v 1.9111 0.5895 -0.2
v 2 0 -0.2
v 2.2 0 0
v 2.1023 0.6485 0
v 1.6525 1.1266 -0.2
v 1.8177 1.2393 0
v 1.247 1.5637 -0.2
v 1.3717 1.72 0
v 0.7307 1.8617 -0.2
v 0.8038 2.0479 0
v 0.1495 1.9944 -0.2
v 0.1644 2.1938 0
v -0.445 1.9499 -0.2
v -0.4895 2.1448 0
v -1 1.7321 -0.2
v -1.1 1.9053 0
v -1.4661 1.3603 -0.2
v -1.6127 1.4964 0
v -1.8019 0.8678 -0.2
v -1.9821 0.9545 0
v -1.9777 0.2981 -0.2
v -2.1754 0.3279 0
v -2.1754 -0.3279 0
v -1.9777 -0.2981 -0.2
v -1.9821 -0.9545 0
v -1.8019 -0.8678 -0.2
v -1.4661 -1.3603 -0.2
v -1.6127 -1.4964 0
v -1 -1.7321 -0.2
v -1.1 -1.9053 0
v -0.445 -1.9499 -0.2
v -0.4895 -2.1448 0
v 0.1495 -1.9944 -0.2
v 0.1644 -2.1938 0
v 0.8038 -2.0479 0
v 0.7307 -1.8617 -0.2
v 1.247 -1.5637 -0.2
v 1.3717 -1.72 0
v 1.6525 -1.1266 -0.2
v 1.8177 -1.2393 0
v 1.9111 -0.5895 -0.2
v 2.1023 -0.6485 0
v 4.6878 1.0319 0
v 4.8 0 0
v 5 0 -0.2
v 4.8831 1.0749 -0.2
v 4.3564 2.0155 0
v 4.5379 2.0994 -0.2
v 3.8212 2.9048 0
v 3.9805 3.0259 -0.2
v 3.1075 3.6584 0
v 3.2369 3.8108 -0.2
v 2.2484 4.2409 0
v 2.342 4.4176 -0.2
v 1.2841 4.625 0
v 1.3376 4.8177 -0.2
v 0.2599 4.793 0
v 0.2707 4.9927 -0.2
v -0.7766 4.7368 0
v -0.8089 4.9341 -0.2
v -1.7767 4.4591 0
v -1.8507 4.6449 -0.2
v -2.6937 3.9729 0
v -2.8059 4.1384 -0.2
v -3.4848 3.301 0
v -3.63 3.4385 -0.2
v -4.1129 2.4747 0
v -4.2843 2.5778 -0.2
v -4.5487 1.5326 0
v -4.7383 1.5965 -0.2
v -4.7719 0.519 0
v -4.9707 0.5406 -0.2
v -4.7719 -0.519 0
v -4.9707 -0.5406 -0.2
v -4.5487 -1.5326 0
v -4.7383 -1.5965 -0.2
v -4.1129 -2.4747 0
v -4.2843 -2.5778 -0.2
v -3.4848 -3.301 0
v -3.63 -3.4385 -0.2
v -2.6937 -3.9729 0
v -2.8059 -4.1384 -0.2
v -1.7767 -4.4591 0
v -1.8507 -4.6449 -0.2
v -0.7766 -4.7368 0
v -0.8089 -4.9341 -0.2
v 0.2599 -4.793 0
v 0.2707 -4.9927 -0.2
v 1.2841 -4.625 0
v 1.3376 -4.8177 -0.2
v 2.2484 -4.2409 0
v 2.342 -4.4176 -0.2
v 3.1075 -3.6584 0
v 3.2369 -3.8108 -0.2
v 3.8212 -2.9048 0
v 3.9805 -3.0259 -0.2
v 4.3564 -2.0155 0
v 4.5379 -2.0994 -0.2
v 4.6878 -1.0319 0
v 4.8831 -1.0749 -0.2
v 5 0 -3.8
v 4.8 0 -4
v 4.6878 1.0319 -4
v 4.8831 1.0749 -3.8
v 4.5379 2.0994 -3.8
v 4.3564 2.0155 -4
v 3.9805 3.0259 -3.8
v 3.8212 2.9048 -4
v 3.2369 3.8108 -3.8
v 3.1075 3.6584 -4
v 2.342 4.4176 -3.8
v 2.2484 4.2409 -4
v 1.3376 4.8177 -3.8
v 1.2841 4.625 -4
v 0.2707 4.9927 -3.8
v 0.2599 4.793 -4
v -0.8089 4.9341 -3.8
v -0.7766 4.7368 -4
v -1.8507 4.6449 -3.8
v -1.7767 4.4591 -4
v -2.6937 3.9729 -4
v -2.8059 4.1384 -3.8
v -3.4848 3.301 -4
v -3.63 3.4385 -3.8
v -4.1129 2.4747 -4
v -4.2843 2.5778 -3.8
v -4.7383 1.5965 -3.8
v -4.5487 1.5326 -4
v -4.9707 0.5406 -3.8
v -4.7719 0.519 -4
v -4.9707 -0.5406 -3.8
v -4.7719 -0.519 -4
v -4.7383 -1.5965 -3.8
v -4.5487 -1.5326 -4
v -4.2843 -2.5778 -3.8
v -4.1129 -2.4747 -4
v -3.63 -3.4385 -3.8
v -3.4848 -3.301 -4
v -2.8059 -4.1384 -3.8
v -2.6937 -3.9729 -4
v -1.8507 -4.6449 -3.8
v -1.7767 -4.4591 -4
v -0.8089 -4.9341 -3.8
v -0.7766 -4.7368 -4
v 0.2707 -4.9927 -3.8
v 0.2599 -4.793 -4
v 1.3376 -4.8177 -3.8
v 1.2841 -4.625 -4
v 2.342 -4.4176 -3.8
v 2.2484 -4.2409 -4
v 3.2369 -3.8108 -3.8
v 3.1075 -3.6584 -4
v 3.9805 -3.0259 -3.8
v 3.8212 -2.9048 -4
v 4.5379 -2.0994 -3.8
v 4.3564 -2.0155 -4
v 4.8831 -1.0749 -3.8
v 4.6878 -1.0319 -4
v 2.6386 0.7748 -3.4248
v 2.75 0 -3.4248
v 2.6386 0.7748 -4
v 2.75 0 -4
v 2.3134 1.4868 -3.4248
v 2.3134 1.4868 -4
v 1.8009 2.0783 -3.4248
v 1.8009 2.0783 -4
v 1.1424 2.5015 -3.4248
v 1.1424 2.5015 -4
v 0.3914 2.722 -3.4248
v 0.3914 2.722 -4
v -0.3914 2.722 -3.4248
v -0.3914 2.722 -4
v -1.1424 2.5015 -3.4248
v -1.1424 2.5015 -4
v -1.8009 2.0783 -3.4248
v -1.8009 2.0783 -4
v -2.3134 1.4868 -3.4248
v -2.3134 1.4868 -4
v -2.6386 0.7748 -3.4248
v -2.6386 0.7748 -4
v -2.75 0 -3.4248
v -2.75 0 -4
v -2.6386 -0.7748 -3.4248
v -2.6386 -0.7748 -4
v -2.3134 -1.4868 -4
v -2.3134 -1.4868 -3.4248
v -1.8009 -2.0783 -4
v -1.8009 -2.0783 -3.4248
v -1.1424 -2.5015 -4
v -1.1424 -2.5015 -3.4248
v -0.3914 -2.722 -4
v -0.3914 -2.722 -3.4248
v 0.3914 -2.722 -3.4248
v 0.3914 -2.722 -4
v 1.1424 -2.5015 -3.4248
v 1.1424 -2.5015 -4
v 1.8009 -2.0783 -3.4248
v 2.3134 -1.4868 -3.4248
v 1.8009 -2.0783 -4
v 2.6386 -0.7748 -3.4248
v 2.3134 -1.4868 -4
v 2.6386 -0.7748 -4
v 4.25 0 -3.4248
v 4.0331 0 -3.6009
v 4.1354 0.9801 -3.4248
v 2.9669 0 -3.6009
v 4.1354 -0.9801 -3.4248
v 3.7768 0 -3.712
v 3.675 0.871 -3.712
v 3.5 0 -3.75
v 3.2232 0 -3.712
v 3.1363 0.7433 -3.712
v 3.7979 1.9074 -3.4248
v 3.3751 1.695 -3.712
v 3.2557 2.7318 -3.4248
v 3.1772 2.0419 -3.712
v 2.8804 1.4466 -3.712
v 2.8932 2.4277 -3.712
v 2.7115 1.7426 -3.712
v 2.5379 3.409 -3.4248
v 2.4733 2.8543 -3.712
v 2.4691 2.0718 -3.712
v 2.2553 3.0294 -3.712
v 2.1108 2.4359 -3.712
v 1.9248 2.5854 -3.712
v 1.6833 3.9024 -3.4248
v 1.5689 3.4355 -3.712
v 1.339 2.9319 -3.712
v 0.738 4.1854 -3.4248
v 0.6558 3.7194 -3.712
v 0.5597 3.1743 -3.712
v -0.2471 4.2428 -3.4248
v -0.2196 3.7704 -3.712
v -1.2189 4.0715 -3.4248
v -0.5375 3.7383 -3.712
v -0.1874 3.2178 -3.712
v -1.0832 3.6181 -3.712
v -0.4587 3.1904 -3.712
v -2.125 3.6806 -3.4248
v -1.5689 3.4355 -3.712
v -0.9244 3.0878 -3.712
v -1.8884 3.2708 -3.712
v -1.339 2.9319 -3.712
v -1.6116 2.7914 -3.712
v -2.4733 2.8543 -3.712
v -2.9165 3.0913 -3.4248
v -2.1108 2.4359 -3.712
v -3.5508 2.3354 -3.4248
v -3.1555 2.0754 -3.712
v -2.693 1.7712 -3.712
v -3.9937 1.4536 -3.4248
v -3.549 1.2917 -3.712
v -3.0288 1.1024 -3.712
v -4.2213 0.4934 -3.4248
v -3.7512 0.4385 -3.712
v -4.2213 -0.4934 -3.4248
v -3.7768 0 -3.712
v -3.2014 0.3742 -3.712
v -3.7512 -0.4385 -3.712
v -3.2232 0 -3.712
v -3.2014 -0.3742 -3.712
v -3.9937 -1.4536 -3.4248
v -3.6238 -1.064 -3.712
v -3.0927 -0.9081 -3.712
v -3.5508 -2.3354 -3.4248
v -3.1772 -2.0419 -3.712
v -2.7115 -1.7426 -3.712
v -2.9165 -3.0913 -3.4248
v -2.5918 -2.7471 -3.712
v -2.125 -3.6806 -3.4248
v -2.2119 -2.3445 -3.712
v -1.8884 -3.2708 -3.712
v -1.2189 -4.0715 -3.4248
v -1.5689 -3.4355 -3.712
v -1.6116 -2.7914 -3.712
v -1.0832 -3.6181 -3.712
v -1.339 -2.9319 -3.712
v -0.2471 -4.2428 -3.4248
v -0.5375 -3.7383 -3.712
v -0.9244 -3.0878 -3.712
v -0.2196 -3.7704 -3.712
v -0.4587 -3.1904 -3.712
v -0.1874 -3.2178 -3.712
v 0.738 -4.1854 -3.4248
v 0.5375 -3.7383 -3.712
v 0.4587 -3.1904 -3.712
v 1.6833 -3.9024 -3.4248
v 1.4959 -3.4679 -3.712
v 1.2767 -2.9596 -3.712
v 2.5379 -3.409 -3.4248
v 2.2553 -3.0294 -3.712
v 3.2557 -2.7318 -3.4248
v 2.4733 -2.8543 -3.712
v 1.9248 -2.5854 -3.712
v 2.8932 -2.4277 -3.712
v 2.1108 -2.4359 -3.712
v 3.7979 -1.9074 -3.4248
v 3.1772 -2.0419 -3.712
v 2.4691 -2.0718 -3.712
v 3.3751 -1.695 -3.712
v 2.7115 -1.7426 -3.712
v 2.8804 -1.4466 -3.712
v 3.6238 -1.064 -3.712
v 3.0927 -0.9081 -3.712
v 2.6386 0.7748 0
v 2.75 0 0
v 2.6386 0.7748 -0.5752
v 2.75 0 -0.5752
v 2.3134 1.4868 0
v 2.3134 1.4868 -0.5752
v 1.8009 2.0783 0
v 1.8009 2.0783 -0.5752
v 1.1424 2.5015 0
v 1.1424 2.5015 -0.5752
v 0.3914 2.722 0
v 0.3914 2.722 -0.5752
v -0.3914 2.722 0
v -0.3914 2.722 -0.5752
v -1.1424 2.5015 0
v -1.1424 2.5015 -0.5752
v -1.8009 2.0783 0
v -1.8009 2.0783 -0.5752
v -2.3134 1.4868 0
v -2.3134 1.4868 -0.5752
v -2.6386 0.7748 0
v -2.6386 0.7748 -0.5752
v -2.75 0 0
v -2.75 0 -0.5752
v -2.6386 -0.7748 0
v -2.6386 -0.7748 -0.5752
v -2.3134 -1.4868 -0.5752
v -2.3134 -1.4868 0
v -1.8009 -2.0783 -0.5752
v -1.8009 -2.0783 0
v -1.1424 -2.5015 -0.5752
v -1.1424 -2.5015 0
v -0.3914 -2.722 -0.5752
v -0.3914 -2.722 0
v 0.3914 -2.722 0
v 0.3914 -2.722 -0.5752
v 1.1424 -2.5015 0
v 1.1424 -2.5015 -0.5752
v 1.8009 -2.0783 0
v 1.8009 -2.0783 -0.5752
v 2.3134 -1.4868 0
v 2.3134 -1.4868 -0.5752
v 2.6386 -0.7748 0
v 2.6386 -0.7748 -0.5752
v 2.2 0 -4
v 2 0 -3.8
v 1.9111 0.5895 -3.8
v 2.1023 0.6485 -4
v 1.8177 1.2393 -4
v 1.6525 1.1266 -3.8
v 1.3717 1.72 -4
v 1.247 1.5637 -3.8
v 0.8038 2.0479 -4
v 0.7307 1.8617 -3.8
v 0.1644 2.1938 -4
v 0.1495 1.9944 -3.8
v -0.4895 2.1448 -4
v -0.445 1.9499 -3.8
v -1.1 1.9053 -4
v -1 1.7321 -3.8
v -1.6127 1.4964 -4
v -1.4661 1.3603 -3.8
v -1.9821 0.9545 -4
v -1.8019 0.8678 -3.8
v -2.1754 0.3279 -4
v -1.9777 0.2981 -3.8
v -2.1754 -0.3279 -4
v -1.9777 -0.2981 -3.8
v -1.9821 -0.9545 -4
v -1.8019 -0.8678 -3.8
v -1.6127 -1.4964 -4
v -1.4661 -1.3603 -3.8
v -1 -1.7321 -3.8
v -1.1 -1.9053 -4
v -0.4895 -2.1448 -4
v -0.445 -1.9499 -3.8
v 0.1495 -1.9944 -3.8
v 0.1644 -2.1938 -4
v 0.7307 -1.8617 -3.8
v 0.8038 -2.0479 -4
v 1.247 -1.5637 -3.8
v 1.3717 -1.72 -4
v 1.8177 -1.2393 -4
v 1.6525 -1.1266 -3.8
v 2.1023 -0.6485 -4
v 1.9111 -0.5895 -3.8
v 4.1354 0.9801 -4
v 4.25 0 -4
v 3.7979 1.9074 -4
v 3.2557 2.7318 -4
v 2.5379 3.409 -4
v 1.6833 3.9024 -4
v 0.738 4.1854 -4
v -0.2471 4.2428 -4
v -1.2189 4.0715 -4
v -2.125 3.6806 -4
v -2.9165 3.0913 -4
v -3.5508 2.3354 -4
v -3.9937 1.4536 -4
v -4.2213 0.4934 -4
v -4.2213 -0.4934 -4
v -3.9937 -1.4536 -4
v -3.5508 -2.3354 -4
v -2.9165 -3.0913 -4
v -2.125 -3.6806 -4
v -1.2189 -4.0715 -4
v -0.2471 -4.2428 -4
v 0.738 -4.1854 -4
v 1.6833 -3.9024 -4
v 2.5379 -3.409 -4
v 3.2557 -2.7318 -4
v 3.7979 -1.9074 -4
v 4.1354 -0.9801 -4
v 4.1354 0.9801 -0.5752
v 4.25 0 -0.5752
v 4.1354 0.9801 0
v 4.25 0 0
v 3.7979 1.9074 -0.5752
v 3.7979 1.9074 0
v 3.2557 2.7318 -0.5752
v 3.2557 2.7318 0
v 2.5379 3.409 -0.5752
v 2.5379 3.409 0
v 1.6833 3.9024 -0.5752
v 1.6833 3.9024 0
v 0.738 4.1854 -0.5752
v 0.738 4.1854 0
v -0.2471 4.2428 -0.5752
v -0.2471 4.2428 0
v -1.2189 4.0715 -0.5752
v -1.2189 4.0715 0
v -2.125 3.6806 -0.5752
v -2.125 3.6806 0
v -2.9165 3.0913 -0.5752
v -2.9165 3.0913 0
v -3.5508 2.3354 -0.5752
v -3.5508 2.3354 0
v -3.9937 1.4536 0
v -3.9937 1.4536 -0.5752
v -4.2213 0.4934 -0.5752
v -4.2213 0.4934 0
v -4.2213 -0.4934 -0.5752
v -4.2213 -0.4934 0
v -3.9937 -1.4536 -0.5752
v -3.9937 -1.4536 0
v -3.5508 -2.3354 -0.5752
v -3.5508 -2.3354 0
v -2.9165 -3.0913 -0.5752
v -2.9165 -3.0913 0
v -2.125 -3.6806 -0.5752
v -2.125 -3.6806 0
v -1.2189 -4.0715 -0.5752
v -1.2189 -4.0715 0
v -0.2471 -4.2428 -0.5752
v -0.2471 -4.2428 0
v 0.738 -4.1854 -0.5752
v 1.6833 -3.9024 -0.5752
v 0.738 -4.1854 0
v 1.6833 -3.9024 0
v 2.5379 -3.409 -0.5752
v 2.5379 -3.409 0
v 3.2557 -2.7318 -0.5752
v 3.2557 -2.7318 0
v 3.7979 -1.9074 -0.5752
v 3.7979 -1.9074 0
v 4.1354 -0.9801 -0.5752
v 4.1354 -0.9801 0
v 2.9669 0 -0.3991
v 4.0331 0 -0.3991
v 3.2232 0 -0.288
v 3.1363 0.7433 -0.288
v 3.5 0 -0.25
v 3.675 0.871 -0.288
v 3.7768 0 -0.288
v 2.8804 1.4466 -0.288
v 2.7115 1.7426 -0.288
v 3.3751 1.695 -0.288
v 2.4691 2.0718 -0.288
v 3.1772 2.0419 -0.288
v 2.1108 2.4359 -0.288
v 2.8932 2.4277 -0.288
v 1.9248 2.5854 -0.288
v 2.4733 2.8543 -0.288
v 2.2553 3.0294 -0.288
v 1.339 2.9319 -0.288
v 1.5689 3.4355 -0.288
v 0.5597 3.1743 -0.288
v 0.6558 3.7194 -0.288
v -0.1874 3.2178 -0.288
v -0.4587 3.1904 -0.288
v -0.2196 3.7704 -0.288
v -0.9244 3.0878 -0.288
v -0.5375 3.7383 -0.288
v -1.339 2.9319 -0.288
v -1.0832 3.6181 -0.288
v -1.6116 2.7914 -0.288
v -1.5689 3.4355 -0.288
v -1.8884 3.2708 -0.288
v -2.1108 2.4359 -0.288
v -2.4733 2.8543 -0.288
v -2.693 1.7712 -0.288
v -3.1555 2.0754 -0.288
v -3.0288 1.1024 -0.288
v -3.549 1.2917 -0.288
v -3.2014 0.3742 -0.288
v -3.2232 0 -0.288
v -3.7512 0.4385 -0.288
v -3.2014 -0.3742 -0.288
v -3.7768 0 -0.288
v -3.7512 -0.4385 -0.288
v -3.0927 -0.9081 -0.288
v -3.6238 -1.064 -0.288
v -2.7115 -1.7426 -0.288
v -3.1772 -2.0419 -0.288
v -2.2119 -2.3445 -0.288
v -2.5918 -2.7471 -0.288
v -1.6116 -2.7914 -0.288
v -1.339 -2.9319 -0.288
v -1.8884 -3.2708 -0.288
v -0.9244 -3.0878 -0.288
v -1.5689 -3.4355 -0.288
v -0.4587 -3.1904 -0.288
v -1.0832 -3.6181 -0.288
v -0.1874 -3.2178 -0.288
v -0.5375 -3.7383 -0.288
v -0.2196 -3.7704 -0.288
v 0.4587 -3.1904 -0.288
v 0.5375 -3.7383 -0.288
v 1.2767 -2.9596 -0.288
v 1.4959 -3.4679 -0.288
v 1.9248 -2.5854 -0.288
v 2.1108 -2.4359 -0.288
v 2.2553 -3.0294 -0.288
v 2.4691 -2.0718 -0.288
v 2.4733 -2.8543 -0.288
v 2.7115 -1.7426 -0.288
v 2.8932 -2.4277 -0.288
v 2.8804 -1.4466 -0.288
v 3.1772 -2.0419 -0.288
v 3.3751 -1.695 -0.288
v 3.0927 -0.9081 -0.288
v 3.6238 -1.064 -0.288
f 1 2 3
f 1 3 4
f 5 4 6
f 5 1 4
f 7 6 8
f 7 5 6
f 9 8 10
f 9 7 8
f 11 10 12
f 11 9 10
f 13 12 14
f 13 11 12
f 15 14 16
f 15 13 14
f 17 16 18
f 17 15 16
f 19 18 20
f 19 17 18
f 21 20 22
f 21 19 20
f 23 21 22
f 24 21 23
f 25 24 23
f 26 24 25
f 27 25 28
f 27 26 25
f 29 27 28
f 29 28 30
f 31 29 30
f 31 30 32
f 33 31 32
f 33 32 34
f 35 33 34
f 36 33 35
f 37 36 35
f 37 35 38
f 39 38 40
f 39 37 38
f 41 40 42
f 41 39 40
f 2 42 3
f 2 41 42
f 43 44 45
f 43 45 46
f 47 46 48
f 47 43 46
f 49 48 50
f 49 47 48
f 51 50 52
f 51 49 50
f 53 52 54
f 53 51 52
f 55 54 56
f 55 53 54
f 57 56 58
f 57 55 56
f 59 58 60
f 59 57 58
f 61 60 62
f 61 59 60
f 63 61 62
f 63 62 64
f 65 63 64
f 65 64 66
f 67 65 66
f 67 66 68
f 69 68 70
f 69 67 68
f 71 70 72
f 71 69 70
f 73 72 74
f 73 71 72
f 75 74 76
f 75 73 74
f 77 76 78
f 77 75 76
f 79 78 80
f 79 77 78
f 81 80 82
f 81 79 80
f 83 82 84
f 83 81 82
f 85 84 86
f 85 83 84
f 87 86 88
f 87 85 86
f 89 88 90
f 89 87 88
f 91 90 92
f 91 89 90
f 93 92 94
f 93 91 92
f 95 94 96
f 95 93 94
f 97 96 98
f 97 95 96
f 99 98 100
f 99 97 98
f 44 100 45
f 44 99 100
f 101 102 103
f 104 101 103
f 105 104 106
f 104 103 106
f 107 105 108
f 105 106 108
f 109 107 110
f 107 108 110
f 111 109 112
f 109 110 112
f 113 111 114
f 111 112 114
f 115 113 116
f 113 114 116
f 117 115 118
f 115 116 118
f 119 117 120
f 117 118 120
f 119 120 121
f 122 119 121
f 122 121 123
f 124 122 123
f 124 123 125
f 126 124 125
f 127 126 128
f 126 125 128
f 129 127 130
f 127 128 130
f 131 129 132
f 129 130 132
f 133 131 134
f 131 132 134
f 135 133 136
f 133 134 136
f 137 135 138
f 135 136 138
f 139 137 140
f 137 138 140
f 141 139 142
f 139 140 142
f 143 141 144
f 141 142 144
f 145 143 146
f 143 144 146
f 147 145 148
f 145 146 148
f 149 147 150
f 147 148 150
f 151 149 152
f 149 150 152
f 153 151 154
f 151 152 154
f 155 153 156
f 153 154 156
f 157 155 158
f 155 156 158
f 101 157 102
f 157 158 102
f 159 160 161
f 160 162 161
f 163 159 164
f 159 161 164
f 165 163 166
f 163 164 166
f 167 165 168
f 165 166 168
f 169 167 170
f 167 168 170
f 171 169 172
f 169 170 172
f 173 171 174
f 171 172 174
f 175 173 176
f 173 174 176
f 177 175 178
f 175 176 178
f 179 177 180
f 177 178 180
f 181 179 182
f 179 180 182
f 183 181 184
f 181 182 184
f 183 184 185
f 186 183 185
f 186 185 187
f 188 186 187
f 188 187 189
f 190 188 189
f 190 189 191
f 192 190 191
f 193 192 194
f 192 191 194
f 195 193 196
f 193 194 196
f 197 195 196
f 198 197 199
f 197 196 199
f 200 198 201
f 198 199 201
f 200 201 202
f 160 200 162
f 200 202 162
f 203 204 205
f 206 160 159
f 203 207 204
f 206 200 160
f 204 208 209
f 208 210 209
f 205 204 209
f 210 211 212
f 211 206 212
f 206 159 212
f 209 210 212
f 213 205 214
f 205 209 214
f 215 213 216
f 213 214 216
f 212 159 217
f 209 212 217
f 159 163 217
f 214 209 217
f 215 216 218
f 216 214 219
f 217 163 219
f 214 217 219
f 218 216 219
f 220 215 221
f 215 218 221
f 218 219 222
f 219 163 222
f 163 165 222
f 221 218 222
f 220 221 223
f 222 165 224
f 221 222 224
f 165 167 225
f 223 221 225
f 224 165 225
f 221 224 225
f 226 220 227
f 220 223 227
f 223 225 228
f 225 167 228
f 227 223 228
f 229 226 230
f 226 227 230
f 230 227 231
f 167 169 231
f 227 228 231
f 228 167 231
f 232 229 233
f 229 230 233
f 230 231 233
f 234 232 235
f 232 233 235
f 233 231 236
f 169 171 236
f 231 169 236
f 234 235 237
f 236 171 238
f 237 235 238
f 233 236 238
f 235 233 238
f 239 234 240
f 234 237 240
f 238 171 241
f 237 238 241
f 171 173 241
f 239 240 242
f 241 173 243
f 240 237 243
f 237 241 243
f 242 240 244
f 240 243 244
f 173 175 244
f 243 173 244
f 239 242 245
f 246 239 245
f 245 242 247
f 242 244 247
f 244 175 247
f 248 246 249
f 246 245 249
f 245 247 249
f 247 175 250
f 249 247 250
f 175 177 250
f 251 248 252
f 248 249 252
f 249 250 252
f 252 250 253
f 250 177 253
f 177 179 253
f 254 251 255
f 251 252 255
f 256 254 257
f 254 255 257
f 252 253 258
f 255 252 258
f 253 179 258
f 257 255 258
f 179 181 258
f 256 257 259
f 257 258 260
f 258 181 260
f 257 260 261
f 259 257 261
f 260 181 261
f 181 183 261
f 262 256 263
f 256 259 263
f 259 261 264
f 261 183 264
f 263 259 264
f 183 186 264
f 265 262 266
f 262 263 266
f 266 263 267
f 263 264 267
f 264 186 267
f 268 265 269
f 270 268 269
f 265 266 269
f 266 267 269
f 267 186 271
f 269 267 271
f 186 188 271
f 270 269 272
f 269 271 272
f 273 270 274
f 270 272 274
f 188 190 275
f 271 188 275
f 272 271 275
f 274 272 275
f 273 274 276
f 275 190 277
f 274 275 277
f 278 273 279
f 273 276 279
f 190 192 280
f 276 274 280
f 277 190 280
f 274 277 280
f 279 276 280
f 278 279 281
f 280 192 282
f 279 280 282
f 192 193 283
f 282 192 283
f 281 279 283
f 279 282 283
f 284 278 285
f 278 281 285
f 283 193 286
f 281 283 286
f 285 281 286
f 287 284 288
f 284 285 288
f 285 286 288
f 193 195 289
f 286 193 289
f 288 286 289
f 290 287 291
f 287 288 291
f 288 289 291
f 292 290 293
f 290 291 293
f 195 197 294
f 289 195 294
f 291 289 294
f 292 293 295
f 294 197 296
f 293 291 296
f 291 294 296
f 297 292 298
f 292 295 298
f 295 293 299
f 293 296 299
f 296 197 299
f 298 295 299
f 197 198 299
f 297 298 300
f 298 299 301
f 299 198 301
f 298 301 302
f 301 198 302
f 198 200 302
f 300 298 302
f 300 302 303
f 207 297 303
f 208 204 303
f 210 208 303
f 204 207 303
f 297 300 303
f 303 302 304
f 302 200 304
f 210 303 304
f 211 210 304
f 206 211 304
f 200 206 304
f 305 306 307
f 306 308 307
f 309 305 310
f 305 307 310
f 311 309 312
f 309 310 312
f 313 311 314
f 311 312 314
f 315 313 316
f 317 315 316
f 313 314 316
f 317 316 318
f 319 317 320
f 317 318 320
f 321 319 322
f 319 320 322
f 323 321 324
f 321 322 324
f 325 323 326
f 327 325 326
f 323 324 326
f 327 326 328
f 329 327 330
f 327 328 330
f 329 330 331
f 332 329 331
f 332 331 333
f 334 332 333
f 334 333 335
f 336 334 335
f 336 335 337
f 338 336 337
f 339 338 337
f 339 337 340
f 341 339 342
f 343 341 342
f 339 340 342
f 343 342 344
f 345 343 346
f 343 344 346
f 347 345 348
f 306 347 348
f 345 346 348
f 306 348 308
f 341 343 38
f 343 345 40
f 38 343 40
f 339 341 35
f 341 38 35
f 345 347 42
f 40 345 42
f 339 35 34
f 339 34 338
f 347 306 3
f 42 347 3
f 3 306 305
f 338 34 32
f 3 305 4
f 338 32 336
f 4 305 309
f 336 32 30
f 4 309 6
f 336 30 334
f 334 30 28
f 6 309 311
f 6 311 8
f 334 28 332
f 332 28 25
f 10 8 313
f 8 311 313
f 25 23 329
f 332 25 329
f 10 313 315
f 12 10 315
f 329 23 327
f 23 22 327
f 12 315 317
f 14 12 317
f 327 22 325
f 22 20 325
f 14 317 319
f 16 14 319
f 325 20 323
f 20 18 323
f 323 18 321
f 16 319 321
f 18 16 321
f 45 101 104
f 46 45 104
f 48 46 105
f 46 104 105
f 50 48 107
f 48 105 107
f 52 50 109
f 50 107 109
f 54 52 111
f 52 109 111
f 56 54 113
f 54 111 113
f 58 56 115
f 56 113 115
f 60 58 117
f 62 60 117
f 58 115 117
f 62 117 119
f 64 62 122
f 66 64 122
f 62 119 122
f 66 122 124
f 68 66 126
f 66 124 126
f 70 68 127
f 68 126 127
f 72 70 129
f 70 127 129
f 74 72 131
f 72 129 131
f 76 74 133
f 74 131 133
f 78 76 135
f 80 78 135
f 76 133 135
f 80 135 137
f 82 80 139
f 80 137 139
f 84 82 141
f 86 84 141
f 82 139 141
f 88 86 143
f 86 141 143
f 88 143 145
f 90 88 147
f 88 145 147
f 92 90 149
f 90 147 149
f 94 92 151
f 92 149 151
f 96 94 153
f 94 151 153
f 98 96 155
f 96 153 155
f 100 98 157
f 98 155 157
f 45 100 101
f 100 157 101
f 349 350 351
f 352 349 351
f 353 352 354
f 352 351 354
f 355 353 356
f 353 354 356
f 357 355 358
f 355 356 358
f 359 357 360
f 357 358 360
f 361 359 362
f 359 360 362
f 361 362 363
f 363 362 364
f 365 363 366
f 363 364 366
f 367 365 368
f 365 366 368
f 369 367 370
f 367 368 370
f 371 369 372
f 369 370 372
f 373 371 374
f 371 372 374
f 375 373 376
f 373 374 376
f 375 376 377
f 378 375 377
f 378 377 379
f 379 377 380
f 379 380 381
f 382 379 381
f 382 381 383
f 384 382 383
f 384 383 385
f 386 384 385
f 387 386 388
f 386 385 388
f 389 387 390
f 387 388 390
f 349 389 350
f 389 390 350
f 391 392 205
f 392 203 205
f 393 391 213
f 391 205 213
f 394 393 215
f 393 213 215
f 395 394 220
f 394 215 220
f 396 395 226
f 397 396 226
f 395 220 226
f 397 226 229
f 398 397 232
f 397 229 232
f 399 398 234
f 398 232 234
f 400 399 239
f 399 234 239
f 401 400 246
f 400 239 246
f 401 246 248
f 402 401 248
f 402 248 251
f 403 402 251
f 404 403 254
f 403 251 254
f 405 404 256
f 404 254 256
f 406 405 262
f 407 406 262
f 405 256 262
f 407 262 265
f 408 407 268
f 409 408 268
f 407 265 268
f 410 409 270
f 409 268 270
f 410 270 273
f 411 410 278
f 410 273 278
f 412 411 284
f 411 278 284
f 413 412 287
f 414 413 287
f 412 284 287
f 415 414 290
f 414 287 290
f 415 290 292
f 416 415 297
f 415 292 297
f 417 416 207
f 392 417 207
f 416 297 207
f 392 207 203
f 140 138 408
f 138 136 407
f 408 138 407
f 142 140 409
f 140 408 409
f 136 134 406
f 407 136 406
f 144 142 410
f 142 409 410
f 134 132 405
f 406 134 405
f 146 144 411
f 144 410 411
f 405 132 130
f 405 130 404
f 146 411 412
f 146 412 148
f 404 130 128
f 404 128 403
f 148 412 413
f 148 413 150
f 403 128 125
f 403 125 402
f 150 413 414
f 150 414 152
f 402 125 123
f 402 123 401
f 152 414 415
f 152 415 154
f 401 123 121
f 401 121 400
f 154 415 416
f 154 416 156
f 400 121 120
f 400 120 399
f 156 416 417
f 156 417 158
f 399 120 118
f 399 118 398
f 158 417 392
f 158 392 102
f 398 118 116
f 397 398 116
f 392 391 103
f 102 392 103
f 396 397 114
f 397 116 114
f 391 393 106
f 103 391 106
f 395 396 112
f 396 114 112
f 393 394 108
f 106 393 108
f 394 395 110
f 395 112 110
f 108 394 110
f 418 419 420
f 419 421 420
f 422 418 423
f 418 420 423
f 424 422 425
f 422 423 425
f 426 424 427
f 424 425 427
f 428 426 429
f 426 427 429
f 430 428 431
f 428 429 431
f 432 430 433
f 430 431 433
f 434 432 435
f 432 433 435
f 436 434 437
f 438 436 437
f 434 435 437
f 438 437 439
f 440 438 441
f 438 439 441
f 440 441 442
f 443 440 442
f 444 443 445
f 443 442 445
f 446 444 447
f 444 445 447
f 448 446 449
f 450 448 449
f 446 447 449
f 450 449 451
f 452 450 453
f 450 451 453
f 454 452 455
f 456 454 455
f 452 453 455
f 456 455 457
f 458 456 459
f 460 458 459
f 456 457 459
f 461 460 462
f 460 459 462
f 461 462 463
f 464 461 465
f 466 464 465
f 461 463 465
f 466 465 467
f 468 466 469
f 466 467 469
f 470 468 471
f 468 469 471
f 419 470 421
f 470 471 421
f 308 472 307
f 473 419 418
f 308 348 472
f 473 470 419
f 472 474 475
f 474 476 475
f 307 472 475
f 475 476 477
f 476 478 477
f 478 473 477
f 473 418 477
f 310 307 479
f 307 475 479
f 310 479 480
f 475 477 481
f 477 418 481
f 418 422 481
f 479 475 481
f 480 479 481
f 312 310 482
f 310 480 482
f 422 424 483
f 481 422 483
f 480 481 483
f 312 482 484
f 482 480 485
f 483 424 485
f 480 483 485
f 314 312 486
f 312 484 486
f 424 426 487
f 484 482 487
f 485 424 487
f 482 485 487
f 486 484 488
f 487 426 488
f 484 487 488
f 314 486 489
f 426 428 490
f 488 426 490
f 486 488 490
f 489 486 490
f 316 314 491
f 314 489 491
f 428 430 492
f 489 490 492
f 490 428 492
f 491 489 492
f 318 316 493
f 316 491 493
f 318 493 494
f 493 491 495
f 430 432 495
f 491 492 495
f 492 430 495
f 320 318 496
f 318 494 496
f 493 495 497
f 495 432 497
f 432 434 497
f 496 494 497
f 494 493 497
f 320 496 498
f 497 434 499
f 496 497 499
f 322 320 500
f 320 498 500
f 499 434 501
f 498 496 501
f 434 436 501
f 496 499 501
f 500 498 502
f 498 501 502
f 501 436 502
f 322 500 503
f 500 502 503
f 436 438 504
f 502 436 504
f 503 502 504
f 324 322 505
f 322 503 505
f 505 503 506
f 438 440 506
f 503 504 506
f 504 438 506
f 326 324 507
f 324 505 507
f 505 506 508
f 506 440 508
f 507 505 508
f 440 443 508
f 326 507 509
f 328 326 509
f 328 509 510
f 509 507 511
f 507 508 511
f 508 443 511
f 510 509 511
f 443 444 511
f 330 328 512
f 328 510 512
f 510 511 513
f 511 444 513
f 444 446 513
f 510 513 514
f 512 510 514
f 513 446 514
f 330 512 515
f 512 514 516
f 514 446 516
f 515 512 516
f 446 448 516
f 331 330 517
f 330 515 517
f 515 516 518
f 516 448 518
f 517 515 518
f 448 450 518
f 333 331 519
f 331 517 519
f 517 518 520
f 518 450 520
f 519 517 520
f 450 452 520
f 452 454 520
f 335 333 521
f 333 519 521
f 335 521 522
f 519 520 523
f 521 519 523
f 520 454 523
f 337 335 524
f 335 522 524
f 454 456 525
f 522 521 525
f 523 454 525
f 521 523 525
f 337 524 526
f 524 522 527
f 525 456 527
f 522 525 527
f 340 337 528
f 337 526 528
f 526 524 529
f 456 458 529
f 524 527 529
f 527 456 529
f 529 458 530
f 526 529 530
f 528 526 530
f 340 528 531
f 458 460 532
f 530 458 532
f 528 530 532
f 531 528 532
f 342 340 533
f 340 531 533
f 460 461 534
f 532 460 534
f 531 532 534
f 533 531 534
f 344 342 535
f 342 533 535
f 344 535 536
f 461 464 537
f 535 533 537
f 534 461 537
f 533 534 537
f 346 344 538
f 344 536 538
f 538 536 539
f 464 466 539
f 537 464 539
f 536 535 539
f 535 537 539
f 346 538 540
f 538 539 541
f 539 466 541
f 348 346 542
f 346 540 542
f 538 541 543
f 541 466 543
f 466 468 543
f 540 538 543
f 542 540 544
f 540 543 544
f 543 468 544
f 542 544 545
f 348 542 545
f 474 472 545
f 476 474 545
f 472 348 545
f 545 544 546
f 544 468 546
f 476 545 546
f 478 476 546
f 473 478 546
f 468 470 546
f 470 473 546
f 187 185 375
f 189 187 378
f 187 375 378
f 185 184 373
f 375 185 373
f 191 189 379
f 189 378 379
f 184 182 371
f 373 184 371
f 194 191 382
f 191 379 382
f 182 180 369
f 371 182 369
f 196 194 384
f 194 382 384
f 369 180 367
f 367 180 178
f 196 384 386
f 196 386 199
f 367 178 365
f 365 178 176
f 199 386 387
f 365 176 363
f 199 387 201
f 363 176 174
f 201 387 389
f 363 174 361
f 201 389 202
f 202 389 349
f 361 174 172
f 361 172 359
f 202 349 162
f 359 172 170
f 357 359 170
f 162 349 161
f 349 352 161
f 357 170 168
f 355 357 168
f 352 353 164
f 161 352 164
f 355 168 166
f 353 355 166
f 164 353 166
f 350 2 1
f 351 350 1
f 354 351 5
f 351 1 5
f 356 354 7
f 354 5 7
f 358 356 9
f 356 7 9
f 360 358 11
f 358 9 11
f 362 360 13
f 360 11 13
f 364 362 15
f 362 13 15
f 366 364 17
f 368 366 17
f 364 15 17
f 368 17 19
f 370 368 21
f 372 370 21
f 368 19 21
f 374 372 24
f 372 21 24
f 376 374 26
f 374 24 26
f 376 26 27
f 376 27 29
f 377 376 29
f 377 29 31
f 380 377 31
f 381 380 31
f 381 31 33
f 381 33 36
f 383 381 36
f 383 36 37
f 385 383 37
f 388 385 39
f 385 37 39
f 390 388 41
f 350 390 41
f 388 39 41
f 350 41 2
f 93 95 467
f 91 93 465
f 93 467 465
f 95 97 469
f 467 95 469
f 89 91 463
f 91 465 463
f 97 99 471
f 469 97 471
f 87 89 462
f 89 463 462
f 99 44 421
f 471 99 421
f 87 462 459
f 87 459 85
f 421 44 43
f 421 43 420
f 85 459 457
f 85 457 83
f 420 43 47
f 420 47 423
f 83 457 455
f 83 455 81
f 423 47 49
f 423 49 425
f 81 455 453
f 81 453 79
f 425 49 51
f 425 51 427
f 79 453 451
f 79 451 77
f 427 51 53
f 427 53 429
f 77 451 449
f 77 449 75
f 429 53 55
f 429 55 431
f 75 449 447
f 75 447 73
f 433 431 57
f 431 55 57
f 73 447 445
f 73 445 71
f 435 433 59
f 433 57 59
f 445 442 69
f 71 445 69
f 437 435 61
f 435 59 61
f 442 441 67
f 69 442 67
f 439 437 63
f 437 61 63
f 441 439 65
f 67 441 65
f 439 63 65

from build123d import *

# Parameters (mm, degrees)
CHAMFER1_SIZE = 0.2
CHAMFER2_SIZE = 0.2
CHAMFER3_SIZE = 0.2
CHAMFER4_SIZE = 0.2


with BuildPart() as part:
    # Sketch1 → Revolve1 (revolve)
    with BuildSketch(Plane(origin=(0, 0, 0), x_dir=(1, 0, 0), z_dir=(0, 1, 0))):
        with BuildLine():
            Line((2.75, 3.424799903), (2.75, 4))
            Line((2.75, 4), (2, 4))
            Line((2, 4), (2, 0))
            Line((2, 0), (2.75, 0))
            Line((2.75, 0), (2.75, 0.575200097))
            ThreePointArc((2.75, 0.575200097), (3.5, 0.25), (4.25, 0.575200097))
            Line((4.25, 0.575200097), (4.25, 0))
            Line((4.25, 0), (5, 0))
            Line((5, 0), (5, 4))
            Line((5, 4), (4.25, 4))
            Line((4.25, 4), (4.25, 3.424799903))
            ThreePointArc((4.25, 3.424799903), (3.5, 3.75), (2.75, 3.424799903))
        make_face()
    revolve(axis=Axis((0, 0, -4), (0, 0, 1)))

    # Chamfer1
    chamfer1_edges = [part.edges().sort_by_distance(p)[0] for p in [
        (-5, 0, -4),
    ]]
    chamfer(chamfer1_edges, length=CHAMFER1_SIZE)

    # Chamfer2
    chamfer2_edges = [part.edges().sort_by_distance(p)[0] for p in [
        (-2, 0, -4),
    ]]
    chamfer(chamfer2_edges, length=CHAMFER2_SIZE)

    # Chamfer3
    chamfer3_edges = [part.edges().sort_by_distance(p)[0] for p in [
        (-5, 0, 0),
    ]]
    chamfer(chamfer3_edges, length=CHAMFER3_SIZE)

    # Chamfer4
    chamfer4_edges = [part.edges().sort_by_distance(p)[0] for p in [
        (-2, 0, 0),
    ]]
    chamfer(chamfer4_edges, length=CHAMFER4_SIZE)


solid = part.part
